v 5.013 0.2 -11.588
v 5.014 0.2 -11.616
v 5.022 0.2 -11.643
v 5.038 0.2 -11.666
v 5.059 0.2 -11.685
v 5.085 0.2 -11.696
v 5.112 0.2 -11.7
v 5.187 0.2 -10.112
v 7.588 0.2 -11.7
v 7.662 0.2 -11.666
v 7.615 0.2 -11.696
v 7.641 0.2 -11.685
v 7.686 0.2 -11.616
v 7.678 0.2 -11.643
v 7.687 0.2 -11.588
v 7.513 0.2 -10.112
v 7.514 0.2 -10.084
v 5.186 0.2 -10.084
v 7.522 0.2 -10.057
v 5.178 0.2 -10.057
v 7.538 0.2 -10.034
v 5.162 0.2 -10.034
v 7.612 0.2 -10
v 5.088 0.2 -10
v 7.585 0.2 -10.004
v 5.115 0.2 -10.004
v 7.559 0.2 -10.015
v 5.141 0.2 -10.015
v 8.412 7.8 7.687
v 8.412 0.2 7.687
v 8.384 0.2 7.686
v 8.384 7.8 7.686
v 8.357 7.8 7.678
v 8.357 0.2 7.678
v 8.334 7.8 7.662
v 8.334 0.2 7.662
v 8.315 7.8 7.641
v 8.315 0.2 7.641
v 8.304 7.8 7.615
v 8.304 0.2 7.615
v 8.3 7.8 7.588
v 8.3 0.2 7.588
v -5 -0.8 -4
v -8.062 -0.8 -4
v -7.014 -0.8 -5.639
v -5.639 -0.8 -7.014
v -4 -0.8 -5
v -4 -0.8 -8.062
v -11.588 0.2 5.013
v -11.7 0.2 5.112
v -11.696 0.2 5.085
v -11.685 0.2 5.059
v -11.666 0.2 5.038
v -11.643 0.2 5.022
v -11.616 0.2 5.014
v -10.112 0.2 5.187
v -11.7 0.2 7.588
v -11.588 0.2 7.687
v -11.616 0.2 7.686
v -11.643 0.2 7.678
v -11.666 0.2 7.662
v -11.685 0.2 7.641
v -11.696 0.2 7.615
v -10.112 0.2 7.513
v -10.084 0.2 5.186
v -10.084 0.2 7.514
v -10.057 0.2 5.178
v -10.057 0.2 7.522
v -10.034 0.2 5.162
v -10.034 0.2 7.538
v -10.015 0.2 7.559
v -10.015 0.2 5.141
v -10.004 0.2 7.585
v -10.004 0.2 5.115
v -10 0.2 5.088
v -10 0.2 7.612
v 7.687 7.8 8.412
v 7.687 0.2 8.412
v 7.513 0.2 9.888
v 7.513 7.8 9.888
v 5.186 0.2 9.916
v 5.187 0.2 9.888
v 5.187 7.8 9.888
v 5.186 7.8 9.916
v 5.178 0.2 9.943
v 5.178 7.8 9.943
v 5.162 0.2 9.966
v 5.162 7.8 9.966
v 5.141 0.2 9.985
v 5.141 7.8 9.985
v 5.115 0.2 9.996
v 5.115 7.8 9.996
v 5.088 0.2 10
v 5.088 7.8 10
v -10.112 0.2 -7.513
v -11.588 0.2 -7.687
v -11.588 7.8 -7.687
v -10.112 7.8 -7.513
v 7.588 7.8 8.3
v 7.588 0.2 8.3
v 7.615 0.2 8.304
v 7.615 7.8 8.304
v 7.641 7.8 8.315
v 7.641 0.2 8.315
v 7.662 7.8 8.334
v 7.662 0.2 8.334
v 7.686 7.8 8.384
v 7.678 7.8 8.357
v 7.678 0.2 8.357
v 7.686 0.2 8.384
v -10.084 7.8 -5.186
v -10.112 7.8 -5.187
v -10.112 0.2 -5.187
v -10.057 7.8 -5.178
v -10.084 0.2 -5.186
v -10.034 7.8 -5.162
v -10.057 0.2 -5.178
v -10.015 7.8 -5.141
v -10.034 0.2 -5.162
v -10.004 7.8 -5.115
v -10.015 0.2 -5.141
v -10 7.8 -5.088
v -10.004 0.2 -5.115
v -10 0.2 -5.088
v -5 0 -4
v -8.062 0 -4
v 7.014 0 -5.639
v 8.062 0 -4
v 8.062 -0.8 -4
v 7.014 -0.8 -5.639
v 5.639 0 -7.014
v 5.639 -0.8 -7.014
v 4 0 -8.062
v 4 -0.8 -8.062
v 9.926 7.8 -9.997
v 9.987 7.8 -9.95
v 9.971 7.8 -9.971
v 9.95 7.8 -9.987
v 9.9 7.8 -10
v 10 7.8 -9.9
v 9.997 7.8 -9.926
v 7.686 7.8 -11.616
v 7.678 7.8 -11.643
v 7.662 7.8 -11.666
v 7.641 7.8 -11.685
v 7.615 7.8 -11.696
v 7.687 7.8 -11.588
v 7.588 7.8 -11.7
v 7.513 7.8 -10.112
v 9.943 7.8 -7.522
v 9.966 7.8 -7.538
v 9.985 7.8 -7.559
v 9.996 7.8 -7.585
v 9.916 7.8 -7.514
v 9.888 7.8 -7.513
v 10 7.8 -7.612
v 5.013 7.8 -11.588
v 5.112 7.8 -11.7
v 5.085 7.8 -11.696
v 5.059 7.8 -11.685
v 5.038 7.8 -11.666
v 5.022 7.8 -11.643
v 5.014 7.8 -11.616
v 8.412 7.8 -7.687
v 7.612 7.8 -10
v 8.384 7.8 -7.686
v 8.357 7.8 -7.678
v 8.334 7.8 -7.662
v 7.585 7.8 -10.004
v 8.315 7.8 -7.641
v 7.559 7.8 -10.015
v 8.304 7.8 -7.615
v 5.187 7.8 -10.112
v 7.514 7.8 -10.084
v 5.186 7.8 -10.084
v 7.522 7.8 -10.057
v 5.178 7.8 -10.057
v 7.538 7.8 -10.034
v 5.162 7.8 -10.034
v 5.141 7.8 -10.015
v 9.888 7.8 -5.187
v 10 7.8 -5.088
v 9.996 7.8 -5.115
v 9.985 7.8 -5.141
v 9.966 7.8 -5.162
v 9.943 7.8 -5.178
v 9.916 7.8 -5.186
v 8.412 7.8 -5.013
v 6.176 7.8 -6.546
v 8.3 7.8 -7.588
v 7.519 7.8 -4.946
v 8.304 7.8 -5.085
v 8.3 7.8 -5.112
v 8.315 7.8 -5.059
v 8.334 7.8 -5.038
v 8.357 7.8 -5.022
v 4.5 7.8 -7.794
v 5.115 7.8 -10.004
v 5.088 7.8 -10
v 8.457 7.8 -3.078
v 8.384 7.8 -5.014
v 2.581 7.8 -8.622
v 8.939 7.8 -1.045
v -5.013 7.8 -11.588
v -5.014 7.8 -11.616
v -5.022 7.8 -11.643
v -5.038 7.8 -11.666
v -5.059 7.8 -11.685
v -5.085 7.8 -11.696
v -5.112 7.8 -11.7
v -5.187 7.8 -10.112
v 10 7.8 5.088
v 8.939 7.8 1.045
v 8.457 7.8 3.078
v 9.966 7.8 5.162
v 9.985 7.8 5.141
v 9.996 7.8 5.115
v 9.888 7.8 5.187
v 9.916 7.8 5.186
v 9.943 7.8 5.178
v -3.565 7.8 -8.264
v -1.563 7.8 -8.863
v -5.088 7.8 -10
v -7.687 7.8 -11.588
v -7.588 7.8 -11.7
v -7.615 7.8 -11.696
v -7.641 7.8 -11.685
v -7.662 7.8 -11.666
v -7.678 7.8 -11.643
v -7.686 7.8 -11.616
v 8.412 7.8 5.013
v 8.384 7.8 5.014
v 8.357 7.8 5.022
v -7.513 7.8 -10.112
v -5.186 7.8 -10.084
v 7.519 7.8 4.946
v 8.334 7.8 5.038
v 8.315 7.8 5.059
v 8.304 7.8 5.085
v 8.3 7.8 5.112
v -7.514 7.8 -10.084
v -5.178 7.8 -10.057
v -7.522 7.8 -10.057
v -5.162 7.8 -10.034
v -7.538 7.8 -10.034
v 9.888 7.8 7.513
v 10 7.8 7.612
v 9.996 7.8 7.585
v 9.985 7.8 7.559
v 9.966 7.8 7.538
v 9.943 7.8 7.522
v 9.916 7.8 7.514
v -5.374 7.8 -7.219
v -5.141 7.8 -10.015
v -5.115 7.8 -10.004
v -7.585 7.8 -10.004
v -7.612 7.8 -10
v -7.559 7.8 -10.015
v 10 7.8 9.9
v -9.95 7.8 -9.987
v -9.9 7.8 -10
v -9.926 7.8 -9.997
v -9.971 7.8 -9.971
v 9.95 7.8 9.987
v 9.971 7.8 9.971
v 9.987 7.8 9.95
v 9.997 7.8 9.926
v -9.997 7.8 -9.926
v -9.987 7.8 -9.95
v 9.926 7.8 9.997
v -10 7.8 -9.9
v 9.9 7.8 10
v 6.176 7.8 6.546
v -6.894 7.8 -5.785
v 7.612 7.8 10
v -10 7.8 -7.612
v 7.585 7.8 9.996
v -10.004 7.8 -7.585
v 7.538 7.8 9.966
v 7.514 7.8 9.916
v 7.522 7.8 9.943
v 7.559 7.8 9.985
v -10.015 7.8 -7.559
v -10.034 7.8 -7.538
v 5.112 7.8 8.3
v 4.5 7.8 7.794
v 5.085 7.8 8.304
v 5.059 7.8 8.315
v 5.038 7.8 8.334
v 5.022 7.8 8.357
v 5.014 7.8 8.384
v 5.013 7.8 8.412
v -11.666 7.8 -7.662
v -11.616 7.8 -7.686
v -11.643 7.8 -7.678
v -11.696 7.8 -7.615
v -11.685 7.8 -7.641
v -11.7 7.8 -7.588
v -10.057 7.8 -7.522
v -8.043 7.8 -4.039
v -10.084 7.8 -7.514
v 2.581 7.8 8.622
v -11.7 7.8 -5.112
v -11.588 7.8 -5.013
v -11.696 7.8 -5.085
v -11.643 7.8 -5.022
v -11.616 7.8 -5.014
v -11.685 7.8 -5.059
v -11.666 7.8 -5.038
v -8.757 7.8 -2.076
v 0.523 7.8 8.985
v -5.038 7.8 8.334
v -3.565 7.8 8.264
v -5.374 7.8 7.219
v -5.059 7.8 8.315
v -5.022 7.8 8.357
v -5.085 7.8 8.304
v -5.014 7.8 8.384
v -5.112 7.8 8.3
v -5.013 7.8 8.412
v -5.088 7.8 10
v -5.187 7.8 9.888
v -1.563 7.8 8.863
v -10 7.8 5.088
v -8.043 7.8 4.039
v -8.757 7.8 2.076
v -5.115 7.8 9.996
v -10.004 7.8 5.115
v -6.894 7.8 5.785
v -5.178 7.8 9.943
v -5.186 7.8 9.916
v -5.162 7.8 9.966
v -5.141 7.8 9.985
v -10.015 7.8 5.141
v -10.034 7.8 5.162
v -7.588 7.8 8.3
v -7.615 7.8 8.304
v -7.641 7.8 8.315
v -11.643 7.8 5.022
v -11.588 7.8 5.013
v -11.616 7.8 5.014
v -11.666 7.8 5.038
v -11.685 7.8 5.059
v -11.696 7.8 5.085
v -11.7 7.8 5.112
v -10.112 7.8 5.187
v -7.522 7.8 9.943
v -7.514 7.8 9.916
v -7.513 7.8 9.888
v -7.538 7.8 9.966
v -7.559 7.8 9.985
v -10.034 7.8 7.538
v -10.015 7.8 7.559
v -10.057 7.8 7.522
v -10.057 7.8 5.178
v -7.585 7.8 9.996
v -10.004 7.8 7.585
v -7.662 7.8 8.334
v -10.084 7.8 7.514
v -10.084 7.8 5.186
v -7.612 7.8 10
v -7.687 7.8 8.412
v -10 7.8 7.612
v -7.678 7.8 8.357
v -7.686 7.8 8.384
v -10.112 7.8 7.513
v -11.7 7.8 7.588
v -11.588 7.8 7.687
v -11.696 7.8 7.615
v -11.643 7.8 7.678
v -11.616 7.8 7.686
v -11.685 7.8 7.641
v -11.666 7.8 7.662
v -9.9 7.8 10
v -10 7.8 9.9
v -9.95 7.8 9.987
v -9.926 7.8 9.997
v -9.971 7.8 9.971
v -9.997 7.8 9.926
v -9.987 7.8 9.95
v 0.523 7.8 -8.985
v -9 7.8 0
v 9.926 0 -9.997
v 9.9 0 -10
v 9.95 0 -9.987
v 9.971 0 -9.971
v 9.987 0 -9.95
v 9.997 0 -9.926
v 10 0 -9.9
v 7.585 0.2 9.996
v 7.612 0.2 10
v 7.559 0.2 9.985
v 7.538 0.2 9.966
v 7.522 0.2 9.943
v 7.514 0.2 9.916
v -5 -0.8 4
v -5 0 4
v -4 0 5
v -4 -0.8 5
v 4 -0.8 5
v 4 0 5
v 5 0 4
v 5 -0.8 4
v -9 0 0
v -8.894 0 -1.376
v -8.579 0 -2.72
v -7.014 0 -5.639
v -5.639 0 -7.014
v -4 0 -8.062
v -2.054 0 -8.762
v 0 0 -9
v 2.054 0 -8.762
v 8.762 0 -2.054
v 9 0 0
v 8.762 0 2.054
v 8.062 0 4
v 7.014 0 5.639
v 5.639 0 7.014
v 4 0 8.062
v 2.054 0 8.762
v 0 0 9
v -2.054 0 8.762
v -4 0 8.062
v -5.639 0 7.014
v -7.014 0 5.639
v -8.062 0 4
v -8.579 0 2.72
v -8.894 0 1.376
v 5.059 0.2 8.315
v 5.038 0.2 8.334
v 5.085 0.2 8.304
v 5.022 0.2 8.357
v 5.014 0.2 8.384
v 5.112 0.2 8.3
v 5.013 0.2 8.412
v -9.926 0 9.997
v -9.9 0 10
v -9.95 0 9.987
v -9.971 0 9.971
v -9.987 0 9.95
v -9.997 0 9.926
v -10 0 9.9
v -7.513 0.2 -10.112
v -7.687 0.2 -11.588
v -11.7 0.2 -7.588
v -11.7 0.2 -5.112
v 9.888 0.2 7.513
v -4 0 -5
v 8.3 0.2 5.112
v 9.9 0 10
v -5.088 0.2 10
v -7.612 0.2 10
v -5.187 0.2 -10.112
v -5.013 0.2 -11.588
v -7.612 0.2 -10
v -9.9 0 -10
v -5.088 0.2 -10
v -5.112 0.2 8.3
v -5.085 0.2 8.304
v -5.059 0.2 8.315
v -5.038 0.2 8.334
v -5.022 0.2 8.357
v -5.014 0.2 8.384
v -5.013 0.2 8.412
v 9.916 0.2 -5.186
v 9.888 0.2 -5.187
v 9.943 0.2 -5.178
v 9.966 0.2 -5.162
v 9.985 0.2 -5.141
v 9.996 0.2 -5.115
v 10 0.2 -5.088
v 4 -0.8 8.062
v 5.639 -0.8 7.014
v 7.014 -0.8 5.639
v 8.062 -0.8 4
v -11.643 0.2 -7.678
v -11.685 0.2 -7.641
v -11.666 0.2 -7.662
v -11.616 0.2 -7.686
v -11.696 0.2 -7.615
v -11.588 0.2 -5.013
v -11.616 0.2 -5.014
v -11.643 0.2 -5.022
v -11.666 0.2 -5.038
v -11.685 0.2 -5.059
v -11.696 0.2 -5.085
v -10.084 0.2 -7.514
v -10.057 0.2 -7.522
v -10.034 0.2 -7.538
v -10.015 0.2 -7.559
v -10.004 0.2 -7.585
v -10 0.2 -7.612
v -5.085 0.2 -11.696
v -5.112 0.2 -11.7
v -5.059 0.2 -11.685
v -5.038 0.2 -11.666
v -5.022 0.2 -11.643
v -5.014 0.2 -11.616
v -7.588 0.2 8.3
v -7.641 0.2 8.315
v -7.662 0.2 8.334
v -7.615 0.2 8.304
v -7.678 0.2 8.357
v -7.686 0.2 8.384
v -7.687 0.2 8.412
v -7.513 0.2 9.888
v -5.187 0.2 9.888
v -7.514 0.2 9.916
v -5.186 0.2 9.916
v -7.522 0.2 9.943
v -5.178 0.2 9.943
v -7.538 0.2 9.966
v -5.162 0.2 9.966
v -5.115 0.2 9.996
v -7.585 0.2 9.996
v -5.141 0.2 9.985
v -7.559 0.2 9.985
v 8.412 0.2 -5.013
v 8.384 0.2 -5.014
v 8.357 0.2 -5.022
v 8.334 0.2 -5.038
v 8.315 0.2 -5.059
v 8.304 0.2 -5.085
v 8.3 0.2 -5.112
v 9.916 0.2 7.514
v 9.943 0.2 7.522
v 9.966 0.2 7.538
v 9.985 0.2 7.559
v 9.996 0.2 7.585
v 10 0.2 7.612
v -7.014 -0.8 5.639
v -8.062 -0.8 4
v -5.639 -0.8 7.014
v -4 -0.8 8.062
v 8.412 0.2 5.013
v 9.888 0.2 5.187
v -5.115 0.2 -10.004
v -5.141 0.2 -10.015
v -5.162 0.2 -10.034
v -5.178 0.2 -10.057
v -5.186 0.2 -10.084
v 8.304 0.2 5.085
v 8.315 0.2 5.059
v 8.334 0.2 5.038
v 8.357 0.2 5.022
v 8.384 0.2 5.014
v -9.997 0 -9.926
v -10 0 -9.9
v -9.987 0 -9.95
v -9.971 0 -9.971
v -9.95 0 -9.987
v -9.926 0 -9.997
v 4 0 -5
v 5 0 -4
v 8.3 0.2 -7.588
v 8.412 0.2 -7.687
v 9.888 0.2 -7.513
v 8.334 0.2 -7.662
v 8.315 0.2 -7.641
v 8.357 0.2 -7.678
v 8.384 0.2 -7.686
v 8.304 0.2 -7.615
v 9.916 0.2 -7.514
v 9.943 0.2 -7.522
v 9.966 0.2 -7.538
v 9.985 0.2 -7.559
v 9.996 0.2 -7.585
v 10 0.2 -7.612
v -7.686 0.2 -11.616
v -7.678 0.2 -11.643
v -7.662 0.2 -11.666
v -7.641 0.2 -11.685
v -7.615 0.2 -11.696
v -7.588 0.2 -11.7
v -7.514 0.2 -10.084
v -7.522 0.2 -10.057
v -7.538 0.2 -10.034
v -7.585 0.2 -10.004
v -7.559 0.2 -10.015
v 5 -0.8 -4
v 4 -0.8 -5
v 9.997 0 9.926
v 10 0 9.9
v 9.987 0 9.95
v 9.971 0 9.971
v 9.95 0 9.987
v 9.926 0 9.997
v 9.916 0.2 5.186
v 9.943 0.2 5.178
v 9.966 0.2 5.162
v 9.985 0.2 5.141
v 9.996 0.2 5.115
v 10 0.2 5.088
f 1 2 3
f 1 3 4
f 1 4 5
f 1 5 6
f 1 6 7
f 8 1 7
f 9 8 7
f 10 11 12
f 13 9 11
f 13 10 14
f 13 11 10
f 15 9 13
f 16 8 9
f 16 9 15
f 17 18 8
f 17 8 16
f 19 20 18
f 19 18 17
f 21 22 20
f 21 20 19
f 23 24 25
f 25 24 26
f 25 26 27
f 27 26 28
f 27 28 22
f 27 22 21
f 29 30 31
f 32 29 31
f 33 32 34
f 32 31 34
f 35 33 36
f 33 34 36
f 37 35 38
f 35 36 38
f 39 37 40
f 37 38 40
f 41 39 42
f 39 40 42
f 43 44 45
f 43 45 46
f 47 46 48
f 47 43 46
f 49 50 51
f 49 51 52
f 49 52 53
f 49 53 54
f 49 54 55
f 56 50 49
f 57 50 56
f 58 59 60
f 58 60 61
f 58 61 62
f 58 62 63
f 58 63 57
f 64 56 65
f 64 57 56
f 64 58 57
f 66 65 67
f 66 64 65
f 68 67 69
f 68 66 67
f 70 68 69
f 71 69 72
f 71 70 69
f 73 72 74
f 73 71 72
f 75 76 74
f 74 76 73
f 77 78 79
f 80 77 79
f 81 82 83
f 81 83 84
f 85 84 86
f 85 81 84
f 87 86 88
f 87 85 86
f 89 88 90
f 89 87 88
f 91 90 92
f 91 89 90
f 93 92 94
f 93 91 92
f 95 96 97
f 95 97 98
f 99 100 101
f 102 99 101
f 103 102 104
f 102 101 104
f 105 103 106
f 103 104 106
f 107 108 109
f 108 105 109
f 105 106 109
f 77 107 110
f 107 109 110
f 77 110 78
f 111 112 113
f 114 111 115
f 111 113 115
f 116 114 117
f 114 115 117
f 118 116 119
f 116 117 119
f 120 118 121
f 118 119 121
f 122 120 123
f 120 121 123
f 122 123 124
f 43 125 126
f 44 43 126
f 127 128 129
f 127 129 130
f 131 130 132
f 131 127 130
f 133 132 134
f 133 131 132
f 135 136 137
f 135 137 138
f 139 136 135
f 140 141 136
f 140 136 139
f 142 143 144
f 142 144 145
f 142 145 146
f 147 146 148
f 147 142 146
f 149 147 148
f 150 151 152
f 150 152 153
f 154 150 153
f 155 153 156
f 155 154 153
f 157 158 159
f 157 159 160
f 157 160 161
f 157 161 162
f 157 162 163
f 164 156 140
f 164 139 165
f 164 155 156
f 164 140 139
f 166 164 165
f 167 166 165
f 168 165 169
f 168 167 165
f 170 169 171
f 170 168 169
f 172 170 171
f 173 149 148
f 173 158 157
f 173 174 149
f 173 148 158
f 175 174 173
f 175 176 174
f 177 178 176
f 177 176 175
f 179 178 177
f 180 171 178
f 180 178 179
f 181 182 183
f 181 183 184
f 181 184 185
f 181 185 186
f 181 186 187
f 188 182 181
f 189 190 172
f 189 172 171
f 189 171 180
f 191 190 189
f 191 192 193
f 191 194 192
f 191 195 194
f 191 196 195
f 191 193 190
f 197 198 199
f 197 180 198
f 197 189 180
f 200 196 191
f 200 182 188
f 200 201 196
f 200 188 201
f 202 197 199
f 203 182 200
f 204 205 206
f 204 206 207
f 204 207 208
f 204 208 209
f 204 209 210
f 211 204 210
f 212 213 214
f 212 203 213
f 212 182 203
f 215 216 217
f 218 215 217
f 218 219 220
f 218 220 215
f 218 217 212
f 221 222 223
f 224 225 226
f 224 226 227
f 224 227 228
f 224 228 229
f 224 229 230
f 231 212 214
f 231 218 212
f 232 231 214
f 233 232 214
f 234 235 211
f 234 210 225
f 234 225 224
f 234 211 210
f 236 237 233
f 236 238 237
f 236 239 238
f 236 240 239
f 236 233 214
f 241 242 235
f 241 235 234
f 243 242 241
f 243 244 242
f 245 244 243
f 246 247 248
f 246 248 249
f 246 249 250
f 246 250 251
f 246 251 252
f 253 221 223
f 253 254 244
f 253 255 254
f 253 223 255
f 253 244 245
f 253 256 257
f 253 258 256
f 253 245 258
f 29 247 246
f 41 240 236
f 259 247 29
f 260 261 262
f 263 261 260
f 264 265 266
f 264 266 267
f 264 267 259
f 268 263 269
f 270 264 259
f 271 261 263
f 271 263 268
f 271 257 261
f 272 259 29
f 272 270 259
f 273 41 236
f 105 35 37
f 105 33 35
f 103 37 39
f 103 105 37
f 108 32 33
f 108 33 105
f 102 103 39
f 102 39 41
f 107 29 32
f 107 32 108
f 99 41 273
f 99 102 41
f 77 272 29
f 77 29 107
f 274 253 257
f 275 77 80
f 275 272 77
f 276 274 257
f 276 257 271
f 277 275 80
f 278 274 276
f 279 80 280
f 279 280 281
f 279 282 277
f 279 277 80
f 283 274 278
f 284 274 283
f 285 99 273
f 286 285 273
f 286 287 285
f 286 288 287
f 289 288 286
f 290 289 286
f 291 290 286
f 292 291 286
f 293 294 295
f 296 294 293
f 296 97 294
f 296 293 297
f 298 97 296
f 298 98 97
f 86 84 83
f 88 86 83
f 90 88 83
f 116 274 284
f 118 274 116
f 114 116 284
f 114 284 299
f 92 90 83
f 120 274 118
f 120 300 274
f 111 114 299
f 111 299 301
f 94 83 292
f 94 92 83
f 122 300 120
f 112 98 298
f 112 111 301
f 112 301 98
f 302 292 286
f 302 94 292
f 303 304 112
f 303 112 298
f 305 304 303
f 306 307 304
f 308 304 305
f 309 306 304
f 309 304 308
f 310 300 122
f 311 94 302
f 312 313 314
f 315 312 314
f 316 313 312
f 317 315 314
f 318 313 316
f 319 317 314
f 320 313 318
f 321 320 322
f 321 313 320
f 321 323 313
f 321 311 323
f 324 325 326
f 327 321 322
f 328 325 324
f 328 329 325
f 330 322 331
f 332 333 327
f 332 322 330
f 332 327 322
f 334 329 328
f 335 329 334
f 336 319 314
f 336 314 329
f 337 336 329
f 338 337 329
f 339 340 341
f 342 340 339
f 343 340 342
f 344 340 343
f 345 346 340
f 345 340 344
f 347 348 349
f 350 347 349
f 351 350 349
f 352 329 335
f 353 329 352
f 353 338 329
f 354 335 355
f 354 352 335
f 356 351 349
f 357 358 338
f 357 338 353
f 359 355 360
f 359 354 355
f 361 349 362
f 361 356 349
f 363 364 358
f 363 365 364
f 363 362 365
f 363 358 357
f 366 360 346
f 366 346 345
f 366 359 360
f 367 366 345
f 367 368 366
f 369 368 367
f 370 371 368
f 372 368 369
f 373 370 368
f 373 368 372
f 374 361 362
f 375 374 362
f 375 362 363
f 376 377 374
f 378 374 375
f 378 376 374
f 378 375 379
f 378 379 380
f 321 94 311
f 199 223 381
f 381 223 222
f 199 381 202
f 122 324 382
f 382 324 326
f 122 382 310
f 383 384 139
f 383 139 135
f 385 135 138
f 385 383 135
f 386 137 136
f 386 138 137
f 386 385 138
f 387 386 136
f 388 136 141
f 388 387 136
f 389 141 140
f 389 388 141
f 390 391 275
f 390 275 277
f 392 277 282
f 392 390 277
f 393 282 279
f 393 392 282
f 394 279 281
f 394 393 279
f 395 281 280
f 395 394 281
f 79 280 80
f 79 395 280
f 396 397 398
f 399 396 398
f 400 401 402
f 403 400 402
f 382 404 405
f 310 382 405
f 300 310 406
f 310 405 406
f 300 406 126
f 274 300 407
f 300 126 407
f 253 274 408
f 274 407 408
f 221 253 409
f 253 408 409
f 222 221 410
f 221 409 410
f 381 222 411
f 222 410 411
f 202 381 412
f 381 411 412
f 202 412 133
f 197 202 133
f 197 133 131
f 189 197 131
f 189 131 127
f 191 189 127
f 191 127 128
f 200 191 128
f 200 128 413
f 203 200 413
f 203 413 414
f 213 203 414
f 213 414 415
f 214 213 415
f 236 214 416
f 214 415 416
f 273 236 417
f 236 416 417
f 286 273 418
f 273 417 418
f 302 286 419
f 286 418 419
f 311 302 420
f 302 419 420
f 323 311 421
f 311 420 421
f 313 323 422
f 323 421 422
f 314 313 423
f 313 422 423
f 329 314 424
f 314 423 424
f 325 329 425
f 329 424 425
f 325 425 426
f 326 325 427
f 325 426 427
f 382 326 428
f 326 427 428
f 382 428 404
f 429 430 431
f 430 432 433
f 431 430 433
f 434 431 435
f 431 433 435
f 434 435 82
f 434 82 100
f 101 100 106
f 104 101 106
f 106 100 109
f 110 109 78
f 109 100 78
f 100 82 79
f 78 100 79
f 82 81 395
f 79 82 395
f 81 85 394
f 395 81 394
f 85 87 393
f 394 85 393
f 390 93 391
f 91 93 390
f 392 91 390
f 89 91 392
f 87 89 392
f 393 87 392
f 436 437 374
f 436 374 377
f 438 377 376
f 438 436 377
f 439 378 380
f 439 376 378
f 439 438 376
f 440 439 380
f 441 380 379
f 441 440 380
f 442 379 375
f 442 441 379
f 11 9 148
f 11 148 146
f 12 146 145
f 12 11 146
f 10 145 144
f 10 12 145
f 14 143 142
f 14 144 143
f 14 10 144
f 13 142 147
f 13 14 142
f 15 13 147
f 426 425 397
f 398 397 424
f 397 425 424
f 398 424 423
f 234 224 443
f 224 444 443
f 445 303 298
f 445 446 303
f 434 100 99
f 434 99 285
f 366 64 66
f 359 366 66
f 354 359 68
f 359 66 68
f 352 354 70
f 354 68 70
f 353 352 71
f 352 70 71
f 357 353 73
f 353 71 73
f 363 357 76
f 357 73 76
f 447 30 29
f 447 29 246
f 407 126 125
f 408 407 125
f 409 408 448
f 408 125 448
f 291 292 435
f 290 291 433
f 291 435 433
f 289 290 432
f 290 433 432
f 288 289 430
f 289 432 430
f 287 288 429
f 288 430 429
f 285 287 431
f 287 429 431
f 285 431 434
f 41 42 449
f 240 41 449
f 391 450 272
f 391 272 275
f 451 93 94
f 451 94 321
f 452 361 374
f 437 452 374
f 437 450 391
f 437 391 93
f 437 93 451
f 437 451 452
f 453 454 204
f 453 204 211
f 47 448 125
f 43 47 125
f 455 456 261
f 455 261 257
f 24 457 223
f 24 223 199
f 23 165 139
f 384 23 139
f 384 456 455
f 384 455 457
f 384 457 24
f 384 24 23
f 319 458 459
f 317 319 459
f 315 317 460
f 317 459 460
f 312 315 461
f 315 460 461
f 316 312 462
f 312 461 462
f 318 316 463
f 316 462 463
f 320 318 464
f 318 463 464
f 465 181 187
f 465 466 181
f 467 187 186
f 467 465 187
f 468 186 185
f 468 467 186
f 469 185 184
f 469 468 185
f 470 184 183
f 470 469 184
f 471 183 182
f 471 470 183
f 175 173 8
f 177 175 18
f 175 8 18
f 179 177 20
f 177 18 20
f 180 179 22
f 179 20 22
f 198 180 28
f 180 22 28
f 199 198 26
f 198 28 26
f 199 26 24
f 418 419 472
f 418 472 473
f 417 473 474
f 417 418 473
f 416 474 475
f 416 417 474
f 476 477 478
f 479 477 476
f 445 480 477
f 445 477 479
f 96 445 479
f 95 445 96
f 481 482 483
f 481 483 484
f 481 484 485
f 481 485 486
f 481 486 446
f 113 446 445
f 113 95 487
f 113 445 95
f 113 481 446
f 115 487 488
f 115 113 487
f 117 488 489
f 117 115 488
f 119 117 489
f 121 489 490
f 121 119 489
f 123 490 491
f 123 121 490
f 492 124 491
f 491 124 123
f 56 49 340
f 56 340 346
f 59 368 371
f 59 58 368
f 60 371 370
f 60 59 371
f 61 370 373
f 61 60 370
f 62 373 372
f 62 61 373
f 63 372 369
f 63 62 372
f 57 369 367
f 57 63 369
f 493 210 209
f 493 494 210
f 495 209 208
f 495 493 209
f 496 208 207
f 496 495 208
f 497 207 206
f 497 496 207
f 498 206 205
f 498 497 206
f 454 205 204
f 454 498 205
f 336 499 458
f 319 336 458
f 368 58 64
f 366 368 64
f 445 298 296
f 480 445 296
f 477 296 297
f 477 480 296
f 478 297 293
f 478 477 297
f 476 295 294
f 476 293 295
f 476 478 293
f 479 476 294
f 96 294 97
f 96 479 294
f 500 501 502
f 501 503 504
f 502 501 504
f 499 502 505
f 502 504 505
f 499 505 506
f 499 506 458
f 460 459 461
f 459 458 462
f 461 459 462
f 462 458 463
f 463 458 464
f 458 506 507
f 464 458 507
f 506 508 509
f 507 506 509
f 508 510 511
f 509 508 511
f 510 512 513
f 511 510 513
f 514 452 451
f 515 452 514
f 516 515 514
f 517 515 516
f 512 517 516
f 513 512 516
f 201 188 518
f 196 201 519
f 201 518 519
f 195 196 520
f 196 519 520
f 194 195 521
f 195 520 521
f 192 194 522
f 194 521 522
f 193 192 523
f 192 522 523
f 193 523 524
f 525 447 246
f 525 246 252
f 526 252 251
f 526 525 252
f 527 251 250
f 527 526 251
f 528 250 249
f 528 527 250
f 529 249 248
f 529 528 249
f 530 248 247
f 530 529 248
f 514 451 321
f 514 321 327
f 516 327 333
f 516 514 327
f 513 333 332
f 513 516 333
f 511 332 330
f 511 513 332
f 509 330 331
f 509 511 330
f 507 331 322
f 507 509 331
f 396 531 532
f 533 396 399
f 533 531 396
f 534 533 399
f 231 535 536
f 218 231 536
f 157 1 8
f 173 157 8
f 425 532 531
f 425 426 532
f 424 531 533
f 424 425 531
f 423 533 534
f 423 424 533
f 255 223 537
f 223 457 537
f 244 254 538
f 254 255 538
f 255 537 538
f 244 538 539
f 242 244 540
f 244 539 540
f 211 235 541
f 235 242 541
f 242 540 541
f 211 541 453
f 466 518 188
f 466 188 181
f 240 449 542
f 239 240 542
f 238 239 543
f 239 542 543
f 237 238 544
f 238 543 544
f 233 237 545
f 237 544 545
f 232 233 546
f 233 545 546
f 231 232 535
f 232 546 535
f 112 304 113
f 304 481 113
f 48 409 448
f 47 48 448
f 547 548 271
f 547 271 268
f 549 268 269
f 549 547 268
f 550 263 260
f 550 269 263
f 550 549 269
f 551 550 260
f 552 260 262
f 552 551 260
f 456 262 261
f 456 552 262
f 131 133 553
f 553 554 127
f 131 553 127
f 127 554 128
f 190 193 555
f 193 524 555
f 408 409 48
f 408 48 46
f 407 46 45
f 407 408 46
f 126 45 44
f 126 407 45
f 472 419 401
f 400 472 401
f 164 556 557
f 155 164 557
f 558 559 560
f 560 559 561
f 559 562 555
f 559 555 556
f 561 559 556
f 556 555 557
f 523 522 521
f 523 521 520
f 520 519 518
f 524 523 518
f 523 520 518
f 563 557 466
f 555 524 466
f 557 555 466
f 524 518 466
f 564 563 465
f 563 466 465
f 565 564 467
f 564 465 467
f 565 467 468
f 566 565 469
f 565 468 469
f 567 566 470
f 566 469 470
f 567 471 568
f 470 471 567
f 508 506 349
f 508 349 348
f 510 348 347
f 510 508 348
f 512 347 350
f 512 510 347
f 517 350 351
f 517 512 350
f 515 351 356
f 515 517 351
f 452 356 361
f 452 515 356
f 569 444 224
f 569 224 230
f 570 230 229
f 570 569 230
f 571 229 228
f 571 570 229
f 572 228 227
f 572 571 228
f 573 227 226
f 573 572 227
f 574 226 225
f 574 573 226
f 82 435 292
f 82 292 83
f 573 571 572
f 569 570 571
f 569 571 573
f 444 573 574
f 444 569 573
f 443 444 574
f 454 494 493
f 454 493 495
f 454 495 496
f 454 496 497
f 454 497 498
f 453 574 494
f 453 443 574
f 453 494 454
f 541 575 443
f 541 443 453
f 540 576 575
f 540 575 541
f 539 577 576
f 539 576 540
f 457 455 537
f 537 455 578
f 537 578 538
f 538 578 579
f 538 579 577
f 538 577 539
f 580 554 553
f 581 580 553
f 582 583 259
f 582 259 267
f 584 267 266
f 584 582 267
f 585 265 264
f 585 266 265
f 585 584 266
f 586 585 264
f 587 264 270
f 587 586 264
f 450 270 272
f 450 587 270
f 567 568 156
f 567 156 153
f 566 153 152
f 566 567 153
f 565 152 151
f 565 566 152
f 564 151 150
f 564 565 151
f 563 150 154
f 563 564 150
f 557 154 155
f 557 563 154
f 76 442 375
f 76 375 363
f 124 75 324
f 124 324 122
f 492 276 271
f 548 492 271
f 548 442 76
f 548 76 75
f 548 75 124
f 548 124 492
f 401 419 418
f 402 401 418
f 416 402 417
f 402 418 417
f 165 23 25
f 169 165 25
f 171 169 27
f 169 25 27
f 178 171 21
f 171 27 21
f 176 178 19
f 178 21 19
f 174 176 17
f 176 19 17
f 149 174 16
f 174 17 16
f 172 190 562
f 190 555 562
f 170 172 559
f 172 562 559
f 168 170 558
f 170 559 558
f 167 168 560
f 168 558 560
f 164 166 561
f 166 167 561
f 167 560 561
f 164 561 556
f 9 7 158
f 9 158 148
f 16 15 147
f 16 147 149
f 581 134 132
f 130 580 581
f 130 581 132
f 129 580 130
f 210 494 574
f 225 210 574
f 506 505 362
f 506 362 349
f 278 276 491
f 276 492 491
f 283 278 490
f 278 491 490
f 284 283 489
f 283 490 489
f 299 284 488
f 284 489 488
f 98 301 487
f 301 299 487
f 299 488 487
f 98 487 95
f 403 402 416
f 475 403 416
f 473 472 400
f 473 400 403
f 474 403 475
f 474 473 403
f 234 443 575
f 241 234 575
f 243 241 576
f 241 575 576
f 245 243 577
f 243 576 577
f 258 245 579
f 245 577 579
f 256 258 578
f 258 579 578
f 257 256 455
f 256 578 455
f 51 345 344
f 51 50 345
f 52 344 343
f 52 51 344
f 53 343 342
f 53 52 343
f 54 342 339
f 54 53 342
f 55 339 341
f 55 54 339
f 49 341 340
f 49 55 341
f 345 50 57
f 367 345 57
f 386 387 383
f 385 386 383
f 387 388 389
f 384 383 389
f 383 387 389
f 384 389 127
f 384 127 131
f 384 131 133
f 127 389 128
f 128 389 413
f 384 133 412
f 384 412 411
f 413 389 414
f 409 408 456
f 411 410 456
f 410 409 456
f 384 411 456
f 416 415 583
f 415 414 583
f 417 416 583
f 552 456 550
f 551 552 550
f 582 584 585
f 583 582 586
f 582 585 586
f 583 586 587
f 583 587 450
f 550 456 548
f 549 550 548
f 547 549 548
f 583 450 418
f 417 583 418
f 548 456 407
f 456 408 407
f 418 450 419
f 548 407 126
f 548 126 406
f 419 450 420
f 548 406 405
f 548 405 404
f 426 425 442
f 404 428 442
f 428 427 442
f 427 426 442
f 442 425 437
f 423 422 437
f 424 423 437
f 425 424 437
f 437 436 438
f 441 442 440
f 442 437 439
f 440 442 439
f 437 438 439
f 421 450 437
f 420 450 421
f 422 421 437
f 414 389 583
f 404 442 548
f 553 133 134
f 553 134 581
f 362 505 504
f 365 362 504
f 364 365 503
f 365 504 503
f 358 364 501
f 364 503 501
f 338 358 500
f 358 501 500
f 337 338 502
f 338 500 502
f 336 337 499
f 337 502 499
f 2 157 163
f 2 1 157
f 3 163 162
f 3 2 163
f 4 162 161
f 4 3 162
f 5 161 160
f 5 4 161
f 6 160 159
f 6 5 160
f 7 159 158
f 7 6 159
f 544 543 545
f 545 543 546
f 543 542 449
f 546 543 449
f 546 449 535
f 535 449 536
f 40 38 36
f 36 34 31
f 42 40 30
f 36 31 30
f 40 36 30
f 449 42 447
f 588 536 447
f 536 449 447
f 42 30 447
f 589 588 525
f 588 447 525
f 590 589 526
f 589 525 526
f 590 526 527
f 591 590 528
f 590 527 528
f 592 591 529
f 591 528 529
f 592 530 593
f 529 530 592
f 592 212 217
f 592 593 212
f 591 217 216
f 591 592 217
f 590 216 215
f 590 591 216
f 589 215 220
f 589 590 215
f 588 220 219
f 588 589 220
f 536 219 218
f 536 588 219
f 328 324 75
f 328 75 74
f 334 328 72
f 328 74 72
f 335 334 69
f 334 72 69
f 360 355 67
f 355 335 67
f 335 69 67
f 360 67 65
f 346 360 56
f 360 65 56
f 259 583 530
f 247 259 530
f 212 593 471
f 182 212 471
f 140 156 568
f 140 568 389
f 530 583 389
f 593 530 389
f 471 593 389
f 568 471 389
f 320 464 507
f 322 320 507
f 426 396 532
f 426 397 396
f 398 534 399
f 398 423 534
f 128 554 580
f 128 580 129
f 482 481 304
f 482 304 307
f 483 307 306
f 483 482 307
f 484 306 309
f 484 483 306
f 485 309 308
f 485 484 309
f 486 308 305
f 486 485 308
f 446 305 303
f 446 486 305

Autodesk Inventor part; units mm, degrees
ref_plane "YZ Plane" through (0, 0, 0) normal (1, 0, 0) x (0, 1, 0)
ref_plane "XZ Plane" through (0, 0, 0) normal (0, 1, 0) x (-1, 0, 0)
ref_plane "XY Plane" through (0, 0, 0) normal (0, 0, 1) x (1, 0, 0)
sketch "Boceto1" plane through (0, 0, 0) normal (0, 1, 0) x (-1, 0, 0)
  circle A0 centre (0, 0) radius 9
  line L0 (0, 0) -> (10, -10) construction
  line L1 (10, 10) -> (-10, -10) construction
  line L2 (-10, 9.9) -> (-10, 7.6125)
  line L3 (-8.3, 6.35) -> (-8.3, 5.1125)
  line L4 (-8.4117, 7.6869) -> (-9.8883, 7.5131)
  line L5 (-8.4117, 5.0131) -> (-9.8883, 5.1869)
  line L6 (-8.3, -6.35) -> (-8.3, -5.1125)
  line L7 (-8.4117, -7.6869) -> (-9.8883, -7.5131)
  line L8 (-8.4117, -5.0131) -> (-9.8883, -5.1869)
  line L9 (-7.6869, 8.4117) -> (-7.5131, 9.8883)
  line L10 (-5.0131, 8.4117) -> (-5.1869, 9.8883)
  line L11 (5.0131, 8.4117) -> (5.1869, 9.8883)
  line L12 (6.35, 8.3) -> (5.1125, 8.3)
  line L13 (7.6869, 8.4117) -> (7.5131, 9.8883)
  line L14 (-5.0131, -11.5883) -> (-5.1869, -10.1117)
  line L15 (-7.6869, -11.5883) -> (-7.5131, -10.1117)
  line L16 (-5.1125, -11.7) -> (-7.5875, -11.7)
  line L17 (7.6869, -11.5883) -> (7.5131, -10.1117)
  line L18 (5.1125, -11.7) -> (7.5875, -11.7)
  line L19 (5.0131, -11.5883) -> (5.1869, -10.1117)
  line L20 (11.5883, -5.0131) -> (10.1117, -5.1869)
  line L21 (11.7, -5.1125) -> (11.7, -7.5875)
  line L22 (11.5883, -7.6869) -> (10.1117, -7.5131)
  line L23 (11.5883, 7.6869) -> (10.1117, 7.5131)
  line L24 (11.5883, 5.0131) -> (10.1117, 5.1869)
  line L25 (11.7, 5.1125) -> (11.7, 7.5875)
  line L26 (10, 9.9) -> (10, 7.6125)
  arc A1 (11.7, 7.5875) -> (11.5883, 7.6869) centre (11.6, 7.5875) ccw
  arc A2 (11.5883, 5.0131) -> (11.7, 5.1125) centre (11.6, 5.1125) ccw
  arc A3 (10, 7.6125) -> (10.1117, 7.5131) centre (10.1, 7.6125) ccw
  arc A4 (10.1117, 5.1869) -> (10, 5.0875) centre (10.1, 5.0875) ccw
  line L27 (10, 5.0875) -> (10, -5.0875)
  line L28 (10, -7.6125) -> (10, -9.9)
  arc A5 (10, -5.0875) -> (10.1117, -5.1869) centre (10.1, -5.0875) ccw
  arc A6 (11.7, -5.1125) -> (11.5883, -5.0131) centre (11.6, -5.1125) ccw
  arc A7 (11.5883, -7.6869) -> (11.7, -7.5875) centre (11.6, -7.5875) ccw
  arc A8 (10.1117, -7.5131) -> (10, -7.6125) centre (10.1, -7.6125) ccw
  line L29 (9.9, -10) -> (7.6125, -10)
  line L30 (5.0875, -10) -> (-5.0875, -10)
  line L31 (-7.6125, -10) -> (-9.9, -10)
  arc A9 (5.1869, -10.1117) -> (5.0875, -10) centre (5.0875, -10.1) ccw
  arc A10 (5.0131, -11.5883) -> (5.1125, -11.7) centre (5.1125, -11.6) ccw
  arc A11 (7.5875, -11.7) -> (7.6869, -11.5883) centre (7.5875, -11.6) ccw
  arc A12 (7.6125, -10) -> (7.5131, -10.1117) centre (7.6125, -10.1) ccw
  arc A13 (-5.0875, -10) -> (-5.1869, -10.1117) centre (-5.0875, -10.1) ccw
  arc A14 (-5.1125, -11.7) -> (-5.0131, -11.5883) centre (-5.1125, -11.6) ccw
  arc A15 (-7.6869, -11.5883) -> (-7.5875, -11.7) centre (-7.5875, -11.6) ccw
  arc A16 (-7.5131, -10.1117) -> (-7.6125, -10) centre (-7.6125, -10.1) ccw
  line L32 (-10, -9.9) -> (-10, -7.6125)
  arc A17 (-10, -5.0875) -> (-9.8883, -5.1869) centre (-9.9, -5.0875) ccw
  arc A18 (-8.3, -5.1125) -> (-8.4117, -5.0131) centre (-8.4, -5.1125) ccw
  arc A19 (-8.4117, -7.6869) -> (-8.3, -7.5875) centre (-8.4, -7.5875) ccw
  arc A20 (-9.8883, -7.5131) -> (-10, -7.6125) centre (-9.9, -7.6125) ccw
  line L33 (-8.3, -6.35) -> (-8.3, -7.5875)
  line L34 (7.6125, 10) -> (9.9, 10)
  arc A21 (7.6125, 10) -> (7.5131, 9.8883) centre (7.6125, 9.9) ccw
  arc A22 (7.5875, 8.3) -> (7.6869, 8.4117) centre (7.5875, 8.4) ccw
  arc A23 (5.0131, 8.4117) -> (5.1125, 8.3) centre (5.1125, 8.4) ccw
  line L35 (6.35, 8.3) -> (7.5875, 8.3)
  line L36 (-9.9, 10) -> (-7.6125, 10)
  line L37 (-5.0875, 10) -> (5.0875, 10)
  line L38 (-7.5875, 8.3) -> (-5.1125, 8.3)
  arc A24 (-5.0875, 10) -> (-5.1869, 9.8883) centre (-5.0875, 9.9) ccw
  arc A25 (-5.1125, 8.3) -> (-5.0131, 8.4117) centre (-5.1125, 8.4) ccw
  arc A26 (-7.5131, 9.8883) -> (-7.6125, 10) centre (-7.6125, 9.9) ccw
  arc A27 (-7.6869, 8.4117) -> (-7.5875, 8.3) centre (-7.5875, 8.4) ccw
  line L39 (-10, -5.0875) -> (-10, 5.0875)
  line L40 (-10, 7.5) -> (-10, 10)
  line L41 (-8.3, 7.3529) -> (-8.3, 7.5875)
  line L42 (-8.3, 7.3529) -> (-8.3, 6.35)
  arc A28 (-8.3, 7.5875) -> (-8.4117, 7.6869) centre (-8.4, 7.5875) ccw
  arc A29 (-10, 7.6125) -> (-9.8883, 7.5131) centre (-9.9, 7.6125) ccw
  arc A30 (-9.8883, 5.1869) -> (-10, 5.0875) centre (-9.9, 5.0875) ccw
  arc A31 (-8.4117, 5.0131) -> (-8.3, 5.1125) centre (-8.4, 5.1125) ccw
  arc A32 (10, 9.9) -> (9.9, 10) centre (9.9, 9.9) ccw
  arc A33 (9.9, -10) -> (10, -9.9) centre (9.9, -9.9) ccw
  arc A34 (-10, -9.9) -> (-9.9, -10) centre (-9.9, -9.9) ccw
  arc A35 (-9.9, 10) -> (-10, 9.9) centre (-9.9, 9.9) ccw
  arc A36 (5.1869, 9.8883) -> (5.0875, 10) centre (5.0875, 9.9) ccw
  point P0 (0, 0)
  point P1 (-10, 5.2)
  point P2 (-8.3, 7.7)
  point P3 (-10, -5.2)
  point P4 (-10, -7.5)
  point P5 (-8.3, -7.7)
  point P6 (5.2, 10)
  point P7 (7.7, 8.3)
  point P8 (-7.5, -10)
  point P9 (7.5, -10)
  point P10 (5.2, -10)
  point P11 (7.7, -11.7)
  point P12 (5, -11.7)
  point P13 (11.7, -5)
  point P14 (10, -5.2)
  point P15 (11.7, -7.7)
  point P16 (10, -7.5)
  point P17 (-5.2, -10)
  dimension "d0" = 18
  dimension "d1" = 20
  dimension "d2" = 20
  dimension "d3" = 2.5
  dimension "d4" = 2.3
  dimension "d8" = 0.1
  dimension "d9" = 0.1
  dimension "d10" = 0.1
  dimension "d11" = 0.1
  dimension "d12" = 0.1
  dimension "d13" = 0.1
  dimension "d14" = 0.1
  dimension "d15" = 0.1
  dimension "d16" = 0.1
  dimension "d17" = 0.1
  dimension "d18" = 0.1
  dimension "d19" = 0.1
  dimension "d43" = 0.1
extrude "Extrusión1" add sketch "Boceto1" along normal blind 7.8
sketch "Boceto2" plane through (0, 0, 0) normal (0, -1, 0) x (1, 0, 0)
  line L0 (5.1125, 8.3) -> (7.5875, 8.3) projected
  line L1 (6.35, 8.3) -> (7.7, 8.3)
  line L2 (6.35, 8.3) -> (5, 8.3)
  line L3 (6.35, 8.3) -> (6.35, 10)
  line L4 (6.35, 10) -> (7.7, 10)
  line L5 (7.6125, 10) -> (9.9, 10) projected
  line L6 (7.7, 8.3) -> (7.7, 10)
  line L7 (5, 8.3) -> (5, 10)
  line L8 (5, 10) -> (6.35, 10)
  point P0 (0, 0)
  dimension "d22" = 1.35
  dimension "d23" = 1.35
  dimension "d24" = 1.7
extrude "Extrusión2" add sketch "Boceto2" against normal blind 0.2
sketch "Boceto3" plane through (0, 0, 0) normal (0, -1, 0) x (1, 0, 0)
  line L0 (-9.9, 10) -> (-7.6125, 10) projected
  line L1 (-8.0303, 10) -> (-4.8001, 10)
  line L2 (-4.8001, 10) -> (-4.8001, 8.1465)
  line L3 (-4.8001, 8.1465) -> (-8.0303, 8.1465)
  line L4 (-8.0303, 8.1465) -> (-8.0303, 10)
  line L5 (10, 9.9) -> (10, 7.6125) projected
  line L6 (10, 8.1465) -> (8.0988, 8.1465)
  line L7 (8.0988, 8.1465) -> (8.0988, 4.6857)
  line L8 (8.0988, 4.6857) -> (10, 4.6857)
  line L9 (10, 4.6857) -> (10, 8.1465)
  line L10 (10, 5.0875) -> (10, -5.0875) projected
  line L11 (10, -4.5899) -> (8.0988, -4.5899)
  line L12 (8.0988, -4.5899) -> (8.0988, -8.0513)
  line L13 (8.0988, -8.0513) -> (10, -8.0513)
  line L14 (10, -8.0513) -> (10, -4.5899)
  point P0 (0, 0)
extrude "Extrusión3" add sketch "Boceto3" against normal blind 0.2
sketch "Boceto4" plane through (0, 0, 0) normal (0, -1, 0) x (1, 0, 0)
  line L0 (9.9, -10) -> (7.6125, -10) projected
  line L1 (8.0587, -10) -> (4.5937, -10)
  line L2 (4.5937, -10) -> (4.5937, -11.8621)
  line L3 (4.5937, -11.8621) -> (8.0587, -11.8621)
  line L4 (8.0587, -11.8621) -> (8.0587, -10)
  line L5 (5.0875, -10) -> (-5.0875, -10) projected
  line L6 (-4.2911, -10) -> (-8.2093, -10)
  line L7 (-8.2093, -10) -> (-8.2093, -11.8621)
  line L8 (-8.2093, -11.8621) -> (-4.2911, -11.8621)
  line L9 (-4.2911, -11.8621) -> (-4.2911, -10)
  line L10 (-10, -9.9) -> (-10, -7.6125) projected
  line L11 (-10, -8.4914) -> (-12.1328, -8.4914)
  line L12 (-12.1328, -8.4914) -> (-12.1328, -3.8938)
  line L13 (-12.1328, -3.8938) -> (-10, -3.8938)
  line L14 (-10, -3.8938) -> (-10, -8.4914)
  line L15 (-10, 7.6125) -> (-10, 9.9) projected
  line L16 (-10, 8.328) -> (-12.1328, 8.328)
  line L17 (-12.1328, 8.328) -> (-12.1328, 4.1194)
  line L18 (-12.1328, 4.1194) -> (-10, 4.1194)
  line L19 (-10, 4.1194) -> (-10, 8.328)
  point P0 (0, 0)
extrude "Extrusión4" cut sketch "Boceto4" against normal blind 0.2
sketch "Boceto5" plane through (0, 0, 0) normal (0, -1, 0) x (1, 0, 0)
  circle A0 centre (0, 0) radius 9 projected
  line L0 (-4, -8.0623) -> (-4, -5)
  line L1 (-5, -4) -> (-8.0623, -4)
  line L2 (-4, 8.0623) -> (-4, 5)
  line L3 (-5, 4) -> (-8.0623, 4)
  line L4 (4, -8.0623) -> (4, -5)
  line L5 (5, -4) -> (8.0623, -4)
  line L6 (4, 8.0623) -> (4, 5)
  line L7 (5, 4) -> (8.0623, 4)
  line L8 (-4, -5) -> (-5, -4)
  line L9 (-5, 4) -> (-4, 5)
  line L10 (4, 5) -> (5, 4)
  line L11 (5, -4) -> (4, -5)
  arc A1 (4, -8.0623) -> (8.0623, -4) centre (0, 0) ccw
  arc A2 (8.0623, 4) -> (4, 8.0623) centre (0, 0) ccw
  arc A3 (-4, 8.0623) -> (-8.0623, 4) centre (0, 0) ccw
  arc A4 (-8.0623, -4) -> (-4, -8.0623) centre (0, 0) ccw
  point P0 (0, -9)
  point P1 (-4, -4)
  point P2 (-4, -10)
  point P3 (-10, -4)
  point P4 (-9, 0)
  point P5 (-4, 4)
  point P6 (-4, 10)
  point P7 (-10, 4)
  point P8 (4, -4)
  point P9 (4, -10)
  point P10 (10, -4)
  point P11 (4, 10)
  point P12 (4, 4)
  point P13 (10, 4)
  dimension "d31" = 6
  dimension "d32" = 6
  dimension "d33" = 1
  dimension "d34" = 1
  dimension "d35" = 1
  dimension "d36" = 1
  dimension "d37" = 1
  dimension "d38" = 1
  dimension "d39" = 1
  dimension "d40" = 1
extrude "Extrusión5" add sketch "Boceto5" along normal blind 0.8 contours L7 L10 L6 A0 | A0 L4 L11 L5 | L2 L9 L3 A0 | A0 L1 L8 L0
equation "\"d34\" = d33"
equation "\"d35\" = d33"
equation "\"d36\" = d35"
equation "\"d37\" = d33"
equation "\"d38\" = d37"
equation "\"d39\" = d33"
equation "\"d40\" = d39"
properties part number "Base_18650" material "Goma"
